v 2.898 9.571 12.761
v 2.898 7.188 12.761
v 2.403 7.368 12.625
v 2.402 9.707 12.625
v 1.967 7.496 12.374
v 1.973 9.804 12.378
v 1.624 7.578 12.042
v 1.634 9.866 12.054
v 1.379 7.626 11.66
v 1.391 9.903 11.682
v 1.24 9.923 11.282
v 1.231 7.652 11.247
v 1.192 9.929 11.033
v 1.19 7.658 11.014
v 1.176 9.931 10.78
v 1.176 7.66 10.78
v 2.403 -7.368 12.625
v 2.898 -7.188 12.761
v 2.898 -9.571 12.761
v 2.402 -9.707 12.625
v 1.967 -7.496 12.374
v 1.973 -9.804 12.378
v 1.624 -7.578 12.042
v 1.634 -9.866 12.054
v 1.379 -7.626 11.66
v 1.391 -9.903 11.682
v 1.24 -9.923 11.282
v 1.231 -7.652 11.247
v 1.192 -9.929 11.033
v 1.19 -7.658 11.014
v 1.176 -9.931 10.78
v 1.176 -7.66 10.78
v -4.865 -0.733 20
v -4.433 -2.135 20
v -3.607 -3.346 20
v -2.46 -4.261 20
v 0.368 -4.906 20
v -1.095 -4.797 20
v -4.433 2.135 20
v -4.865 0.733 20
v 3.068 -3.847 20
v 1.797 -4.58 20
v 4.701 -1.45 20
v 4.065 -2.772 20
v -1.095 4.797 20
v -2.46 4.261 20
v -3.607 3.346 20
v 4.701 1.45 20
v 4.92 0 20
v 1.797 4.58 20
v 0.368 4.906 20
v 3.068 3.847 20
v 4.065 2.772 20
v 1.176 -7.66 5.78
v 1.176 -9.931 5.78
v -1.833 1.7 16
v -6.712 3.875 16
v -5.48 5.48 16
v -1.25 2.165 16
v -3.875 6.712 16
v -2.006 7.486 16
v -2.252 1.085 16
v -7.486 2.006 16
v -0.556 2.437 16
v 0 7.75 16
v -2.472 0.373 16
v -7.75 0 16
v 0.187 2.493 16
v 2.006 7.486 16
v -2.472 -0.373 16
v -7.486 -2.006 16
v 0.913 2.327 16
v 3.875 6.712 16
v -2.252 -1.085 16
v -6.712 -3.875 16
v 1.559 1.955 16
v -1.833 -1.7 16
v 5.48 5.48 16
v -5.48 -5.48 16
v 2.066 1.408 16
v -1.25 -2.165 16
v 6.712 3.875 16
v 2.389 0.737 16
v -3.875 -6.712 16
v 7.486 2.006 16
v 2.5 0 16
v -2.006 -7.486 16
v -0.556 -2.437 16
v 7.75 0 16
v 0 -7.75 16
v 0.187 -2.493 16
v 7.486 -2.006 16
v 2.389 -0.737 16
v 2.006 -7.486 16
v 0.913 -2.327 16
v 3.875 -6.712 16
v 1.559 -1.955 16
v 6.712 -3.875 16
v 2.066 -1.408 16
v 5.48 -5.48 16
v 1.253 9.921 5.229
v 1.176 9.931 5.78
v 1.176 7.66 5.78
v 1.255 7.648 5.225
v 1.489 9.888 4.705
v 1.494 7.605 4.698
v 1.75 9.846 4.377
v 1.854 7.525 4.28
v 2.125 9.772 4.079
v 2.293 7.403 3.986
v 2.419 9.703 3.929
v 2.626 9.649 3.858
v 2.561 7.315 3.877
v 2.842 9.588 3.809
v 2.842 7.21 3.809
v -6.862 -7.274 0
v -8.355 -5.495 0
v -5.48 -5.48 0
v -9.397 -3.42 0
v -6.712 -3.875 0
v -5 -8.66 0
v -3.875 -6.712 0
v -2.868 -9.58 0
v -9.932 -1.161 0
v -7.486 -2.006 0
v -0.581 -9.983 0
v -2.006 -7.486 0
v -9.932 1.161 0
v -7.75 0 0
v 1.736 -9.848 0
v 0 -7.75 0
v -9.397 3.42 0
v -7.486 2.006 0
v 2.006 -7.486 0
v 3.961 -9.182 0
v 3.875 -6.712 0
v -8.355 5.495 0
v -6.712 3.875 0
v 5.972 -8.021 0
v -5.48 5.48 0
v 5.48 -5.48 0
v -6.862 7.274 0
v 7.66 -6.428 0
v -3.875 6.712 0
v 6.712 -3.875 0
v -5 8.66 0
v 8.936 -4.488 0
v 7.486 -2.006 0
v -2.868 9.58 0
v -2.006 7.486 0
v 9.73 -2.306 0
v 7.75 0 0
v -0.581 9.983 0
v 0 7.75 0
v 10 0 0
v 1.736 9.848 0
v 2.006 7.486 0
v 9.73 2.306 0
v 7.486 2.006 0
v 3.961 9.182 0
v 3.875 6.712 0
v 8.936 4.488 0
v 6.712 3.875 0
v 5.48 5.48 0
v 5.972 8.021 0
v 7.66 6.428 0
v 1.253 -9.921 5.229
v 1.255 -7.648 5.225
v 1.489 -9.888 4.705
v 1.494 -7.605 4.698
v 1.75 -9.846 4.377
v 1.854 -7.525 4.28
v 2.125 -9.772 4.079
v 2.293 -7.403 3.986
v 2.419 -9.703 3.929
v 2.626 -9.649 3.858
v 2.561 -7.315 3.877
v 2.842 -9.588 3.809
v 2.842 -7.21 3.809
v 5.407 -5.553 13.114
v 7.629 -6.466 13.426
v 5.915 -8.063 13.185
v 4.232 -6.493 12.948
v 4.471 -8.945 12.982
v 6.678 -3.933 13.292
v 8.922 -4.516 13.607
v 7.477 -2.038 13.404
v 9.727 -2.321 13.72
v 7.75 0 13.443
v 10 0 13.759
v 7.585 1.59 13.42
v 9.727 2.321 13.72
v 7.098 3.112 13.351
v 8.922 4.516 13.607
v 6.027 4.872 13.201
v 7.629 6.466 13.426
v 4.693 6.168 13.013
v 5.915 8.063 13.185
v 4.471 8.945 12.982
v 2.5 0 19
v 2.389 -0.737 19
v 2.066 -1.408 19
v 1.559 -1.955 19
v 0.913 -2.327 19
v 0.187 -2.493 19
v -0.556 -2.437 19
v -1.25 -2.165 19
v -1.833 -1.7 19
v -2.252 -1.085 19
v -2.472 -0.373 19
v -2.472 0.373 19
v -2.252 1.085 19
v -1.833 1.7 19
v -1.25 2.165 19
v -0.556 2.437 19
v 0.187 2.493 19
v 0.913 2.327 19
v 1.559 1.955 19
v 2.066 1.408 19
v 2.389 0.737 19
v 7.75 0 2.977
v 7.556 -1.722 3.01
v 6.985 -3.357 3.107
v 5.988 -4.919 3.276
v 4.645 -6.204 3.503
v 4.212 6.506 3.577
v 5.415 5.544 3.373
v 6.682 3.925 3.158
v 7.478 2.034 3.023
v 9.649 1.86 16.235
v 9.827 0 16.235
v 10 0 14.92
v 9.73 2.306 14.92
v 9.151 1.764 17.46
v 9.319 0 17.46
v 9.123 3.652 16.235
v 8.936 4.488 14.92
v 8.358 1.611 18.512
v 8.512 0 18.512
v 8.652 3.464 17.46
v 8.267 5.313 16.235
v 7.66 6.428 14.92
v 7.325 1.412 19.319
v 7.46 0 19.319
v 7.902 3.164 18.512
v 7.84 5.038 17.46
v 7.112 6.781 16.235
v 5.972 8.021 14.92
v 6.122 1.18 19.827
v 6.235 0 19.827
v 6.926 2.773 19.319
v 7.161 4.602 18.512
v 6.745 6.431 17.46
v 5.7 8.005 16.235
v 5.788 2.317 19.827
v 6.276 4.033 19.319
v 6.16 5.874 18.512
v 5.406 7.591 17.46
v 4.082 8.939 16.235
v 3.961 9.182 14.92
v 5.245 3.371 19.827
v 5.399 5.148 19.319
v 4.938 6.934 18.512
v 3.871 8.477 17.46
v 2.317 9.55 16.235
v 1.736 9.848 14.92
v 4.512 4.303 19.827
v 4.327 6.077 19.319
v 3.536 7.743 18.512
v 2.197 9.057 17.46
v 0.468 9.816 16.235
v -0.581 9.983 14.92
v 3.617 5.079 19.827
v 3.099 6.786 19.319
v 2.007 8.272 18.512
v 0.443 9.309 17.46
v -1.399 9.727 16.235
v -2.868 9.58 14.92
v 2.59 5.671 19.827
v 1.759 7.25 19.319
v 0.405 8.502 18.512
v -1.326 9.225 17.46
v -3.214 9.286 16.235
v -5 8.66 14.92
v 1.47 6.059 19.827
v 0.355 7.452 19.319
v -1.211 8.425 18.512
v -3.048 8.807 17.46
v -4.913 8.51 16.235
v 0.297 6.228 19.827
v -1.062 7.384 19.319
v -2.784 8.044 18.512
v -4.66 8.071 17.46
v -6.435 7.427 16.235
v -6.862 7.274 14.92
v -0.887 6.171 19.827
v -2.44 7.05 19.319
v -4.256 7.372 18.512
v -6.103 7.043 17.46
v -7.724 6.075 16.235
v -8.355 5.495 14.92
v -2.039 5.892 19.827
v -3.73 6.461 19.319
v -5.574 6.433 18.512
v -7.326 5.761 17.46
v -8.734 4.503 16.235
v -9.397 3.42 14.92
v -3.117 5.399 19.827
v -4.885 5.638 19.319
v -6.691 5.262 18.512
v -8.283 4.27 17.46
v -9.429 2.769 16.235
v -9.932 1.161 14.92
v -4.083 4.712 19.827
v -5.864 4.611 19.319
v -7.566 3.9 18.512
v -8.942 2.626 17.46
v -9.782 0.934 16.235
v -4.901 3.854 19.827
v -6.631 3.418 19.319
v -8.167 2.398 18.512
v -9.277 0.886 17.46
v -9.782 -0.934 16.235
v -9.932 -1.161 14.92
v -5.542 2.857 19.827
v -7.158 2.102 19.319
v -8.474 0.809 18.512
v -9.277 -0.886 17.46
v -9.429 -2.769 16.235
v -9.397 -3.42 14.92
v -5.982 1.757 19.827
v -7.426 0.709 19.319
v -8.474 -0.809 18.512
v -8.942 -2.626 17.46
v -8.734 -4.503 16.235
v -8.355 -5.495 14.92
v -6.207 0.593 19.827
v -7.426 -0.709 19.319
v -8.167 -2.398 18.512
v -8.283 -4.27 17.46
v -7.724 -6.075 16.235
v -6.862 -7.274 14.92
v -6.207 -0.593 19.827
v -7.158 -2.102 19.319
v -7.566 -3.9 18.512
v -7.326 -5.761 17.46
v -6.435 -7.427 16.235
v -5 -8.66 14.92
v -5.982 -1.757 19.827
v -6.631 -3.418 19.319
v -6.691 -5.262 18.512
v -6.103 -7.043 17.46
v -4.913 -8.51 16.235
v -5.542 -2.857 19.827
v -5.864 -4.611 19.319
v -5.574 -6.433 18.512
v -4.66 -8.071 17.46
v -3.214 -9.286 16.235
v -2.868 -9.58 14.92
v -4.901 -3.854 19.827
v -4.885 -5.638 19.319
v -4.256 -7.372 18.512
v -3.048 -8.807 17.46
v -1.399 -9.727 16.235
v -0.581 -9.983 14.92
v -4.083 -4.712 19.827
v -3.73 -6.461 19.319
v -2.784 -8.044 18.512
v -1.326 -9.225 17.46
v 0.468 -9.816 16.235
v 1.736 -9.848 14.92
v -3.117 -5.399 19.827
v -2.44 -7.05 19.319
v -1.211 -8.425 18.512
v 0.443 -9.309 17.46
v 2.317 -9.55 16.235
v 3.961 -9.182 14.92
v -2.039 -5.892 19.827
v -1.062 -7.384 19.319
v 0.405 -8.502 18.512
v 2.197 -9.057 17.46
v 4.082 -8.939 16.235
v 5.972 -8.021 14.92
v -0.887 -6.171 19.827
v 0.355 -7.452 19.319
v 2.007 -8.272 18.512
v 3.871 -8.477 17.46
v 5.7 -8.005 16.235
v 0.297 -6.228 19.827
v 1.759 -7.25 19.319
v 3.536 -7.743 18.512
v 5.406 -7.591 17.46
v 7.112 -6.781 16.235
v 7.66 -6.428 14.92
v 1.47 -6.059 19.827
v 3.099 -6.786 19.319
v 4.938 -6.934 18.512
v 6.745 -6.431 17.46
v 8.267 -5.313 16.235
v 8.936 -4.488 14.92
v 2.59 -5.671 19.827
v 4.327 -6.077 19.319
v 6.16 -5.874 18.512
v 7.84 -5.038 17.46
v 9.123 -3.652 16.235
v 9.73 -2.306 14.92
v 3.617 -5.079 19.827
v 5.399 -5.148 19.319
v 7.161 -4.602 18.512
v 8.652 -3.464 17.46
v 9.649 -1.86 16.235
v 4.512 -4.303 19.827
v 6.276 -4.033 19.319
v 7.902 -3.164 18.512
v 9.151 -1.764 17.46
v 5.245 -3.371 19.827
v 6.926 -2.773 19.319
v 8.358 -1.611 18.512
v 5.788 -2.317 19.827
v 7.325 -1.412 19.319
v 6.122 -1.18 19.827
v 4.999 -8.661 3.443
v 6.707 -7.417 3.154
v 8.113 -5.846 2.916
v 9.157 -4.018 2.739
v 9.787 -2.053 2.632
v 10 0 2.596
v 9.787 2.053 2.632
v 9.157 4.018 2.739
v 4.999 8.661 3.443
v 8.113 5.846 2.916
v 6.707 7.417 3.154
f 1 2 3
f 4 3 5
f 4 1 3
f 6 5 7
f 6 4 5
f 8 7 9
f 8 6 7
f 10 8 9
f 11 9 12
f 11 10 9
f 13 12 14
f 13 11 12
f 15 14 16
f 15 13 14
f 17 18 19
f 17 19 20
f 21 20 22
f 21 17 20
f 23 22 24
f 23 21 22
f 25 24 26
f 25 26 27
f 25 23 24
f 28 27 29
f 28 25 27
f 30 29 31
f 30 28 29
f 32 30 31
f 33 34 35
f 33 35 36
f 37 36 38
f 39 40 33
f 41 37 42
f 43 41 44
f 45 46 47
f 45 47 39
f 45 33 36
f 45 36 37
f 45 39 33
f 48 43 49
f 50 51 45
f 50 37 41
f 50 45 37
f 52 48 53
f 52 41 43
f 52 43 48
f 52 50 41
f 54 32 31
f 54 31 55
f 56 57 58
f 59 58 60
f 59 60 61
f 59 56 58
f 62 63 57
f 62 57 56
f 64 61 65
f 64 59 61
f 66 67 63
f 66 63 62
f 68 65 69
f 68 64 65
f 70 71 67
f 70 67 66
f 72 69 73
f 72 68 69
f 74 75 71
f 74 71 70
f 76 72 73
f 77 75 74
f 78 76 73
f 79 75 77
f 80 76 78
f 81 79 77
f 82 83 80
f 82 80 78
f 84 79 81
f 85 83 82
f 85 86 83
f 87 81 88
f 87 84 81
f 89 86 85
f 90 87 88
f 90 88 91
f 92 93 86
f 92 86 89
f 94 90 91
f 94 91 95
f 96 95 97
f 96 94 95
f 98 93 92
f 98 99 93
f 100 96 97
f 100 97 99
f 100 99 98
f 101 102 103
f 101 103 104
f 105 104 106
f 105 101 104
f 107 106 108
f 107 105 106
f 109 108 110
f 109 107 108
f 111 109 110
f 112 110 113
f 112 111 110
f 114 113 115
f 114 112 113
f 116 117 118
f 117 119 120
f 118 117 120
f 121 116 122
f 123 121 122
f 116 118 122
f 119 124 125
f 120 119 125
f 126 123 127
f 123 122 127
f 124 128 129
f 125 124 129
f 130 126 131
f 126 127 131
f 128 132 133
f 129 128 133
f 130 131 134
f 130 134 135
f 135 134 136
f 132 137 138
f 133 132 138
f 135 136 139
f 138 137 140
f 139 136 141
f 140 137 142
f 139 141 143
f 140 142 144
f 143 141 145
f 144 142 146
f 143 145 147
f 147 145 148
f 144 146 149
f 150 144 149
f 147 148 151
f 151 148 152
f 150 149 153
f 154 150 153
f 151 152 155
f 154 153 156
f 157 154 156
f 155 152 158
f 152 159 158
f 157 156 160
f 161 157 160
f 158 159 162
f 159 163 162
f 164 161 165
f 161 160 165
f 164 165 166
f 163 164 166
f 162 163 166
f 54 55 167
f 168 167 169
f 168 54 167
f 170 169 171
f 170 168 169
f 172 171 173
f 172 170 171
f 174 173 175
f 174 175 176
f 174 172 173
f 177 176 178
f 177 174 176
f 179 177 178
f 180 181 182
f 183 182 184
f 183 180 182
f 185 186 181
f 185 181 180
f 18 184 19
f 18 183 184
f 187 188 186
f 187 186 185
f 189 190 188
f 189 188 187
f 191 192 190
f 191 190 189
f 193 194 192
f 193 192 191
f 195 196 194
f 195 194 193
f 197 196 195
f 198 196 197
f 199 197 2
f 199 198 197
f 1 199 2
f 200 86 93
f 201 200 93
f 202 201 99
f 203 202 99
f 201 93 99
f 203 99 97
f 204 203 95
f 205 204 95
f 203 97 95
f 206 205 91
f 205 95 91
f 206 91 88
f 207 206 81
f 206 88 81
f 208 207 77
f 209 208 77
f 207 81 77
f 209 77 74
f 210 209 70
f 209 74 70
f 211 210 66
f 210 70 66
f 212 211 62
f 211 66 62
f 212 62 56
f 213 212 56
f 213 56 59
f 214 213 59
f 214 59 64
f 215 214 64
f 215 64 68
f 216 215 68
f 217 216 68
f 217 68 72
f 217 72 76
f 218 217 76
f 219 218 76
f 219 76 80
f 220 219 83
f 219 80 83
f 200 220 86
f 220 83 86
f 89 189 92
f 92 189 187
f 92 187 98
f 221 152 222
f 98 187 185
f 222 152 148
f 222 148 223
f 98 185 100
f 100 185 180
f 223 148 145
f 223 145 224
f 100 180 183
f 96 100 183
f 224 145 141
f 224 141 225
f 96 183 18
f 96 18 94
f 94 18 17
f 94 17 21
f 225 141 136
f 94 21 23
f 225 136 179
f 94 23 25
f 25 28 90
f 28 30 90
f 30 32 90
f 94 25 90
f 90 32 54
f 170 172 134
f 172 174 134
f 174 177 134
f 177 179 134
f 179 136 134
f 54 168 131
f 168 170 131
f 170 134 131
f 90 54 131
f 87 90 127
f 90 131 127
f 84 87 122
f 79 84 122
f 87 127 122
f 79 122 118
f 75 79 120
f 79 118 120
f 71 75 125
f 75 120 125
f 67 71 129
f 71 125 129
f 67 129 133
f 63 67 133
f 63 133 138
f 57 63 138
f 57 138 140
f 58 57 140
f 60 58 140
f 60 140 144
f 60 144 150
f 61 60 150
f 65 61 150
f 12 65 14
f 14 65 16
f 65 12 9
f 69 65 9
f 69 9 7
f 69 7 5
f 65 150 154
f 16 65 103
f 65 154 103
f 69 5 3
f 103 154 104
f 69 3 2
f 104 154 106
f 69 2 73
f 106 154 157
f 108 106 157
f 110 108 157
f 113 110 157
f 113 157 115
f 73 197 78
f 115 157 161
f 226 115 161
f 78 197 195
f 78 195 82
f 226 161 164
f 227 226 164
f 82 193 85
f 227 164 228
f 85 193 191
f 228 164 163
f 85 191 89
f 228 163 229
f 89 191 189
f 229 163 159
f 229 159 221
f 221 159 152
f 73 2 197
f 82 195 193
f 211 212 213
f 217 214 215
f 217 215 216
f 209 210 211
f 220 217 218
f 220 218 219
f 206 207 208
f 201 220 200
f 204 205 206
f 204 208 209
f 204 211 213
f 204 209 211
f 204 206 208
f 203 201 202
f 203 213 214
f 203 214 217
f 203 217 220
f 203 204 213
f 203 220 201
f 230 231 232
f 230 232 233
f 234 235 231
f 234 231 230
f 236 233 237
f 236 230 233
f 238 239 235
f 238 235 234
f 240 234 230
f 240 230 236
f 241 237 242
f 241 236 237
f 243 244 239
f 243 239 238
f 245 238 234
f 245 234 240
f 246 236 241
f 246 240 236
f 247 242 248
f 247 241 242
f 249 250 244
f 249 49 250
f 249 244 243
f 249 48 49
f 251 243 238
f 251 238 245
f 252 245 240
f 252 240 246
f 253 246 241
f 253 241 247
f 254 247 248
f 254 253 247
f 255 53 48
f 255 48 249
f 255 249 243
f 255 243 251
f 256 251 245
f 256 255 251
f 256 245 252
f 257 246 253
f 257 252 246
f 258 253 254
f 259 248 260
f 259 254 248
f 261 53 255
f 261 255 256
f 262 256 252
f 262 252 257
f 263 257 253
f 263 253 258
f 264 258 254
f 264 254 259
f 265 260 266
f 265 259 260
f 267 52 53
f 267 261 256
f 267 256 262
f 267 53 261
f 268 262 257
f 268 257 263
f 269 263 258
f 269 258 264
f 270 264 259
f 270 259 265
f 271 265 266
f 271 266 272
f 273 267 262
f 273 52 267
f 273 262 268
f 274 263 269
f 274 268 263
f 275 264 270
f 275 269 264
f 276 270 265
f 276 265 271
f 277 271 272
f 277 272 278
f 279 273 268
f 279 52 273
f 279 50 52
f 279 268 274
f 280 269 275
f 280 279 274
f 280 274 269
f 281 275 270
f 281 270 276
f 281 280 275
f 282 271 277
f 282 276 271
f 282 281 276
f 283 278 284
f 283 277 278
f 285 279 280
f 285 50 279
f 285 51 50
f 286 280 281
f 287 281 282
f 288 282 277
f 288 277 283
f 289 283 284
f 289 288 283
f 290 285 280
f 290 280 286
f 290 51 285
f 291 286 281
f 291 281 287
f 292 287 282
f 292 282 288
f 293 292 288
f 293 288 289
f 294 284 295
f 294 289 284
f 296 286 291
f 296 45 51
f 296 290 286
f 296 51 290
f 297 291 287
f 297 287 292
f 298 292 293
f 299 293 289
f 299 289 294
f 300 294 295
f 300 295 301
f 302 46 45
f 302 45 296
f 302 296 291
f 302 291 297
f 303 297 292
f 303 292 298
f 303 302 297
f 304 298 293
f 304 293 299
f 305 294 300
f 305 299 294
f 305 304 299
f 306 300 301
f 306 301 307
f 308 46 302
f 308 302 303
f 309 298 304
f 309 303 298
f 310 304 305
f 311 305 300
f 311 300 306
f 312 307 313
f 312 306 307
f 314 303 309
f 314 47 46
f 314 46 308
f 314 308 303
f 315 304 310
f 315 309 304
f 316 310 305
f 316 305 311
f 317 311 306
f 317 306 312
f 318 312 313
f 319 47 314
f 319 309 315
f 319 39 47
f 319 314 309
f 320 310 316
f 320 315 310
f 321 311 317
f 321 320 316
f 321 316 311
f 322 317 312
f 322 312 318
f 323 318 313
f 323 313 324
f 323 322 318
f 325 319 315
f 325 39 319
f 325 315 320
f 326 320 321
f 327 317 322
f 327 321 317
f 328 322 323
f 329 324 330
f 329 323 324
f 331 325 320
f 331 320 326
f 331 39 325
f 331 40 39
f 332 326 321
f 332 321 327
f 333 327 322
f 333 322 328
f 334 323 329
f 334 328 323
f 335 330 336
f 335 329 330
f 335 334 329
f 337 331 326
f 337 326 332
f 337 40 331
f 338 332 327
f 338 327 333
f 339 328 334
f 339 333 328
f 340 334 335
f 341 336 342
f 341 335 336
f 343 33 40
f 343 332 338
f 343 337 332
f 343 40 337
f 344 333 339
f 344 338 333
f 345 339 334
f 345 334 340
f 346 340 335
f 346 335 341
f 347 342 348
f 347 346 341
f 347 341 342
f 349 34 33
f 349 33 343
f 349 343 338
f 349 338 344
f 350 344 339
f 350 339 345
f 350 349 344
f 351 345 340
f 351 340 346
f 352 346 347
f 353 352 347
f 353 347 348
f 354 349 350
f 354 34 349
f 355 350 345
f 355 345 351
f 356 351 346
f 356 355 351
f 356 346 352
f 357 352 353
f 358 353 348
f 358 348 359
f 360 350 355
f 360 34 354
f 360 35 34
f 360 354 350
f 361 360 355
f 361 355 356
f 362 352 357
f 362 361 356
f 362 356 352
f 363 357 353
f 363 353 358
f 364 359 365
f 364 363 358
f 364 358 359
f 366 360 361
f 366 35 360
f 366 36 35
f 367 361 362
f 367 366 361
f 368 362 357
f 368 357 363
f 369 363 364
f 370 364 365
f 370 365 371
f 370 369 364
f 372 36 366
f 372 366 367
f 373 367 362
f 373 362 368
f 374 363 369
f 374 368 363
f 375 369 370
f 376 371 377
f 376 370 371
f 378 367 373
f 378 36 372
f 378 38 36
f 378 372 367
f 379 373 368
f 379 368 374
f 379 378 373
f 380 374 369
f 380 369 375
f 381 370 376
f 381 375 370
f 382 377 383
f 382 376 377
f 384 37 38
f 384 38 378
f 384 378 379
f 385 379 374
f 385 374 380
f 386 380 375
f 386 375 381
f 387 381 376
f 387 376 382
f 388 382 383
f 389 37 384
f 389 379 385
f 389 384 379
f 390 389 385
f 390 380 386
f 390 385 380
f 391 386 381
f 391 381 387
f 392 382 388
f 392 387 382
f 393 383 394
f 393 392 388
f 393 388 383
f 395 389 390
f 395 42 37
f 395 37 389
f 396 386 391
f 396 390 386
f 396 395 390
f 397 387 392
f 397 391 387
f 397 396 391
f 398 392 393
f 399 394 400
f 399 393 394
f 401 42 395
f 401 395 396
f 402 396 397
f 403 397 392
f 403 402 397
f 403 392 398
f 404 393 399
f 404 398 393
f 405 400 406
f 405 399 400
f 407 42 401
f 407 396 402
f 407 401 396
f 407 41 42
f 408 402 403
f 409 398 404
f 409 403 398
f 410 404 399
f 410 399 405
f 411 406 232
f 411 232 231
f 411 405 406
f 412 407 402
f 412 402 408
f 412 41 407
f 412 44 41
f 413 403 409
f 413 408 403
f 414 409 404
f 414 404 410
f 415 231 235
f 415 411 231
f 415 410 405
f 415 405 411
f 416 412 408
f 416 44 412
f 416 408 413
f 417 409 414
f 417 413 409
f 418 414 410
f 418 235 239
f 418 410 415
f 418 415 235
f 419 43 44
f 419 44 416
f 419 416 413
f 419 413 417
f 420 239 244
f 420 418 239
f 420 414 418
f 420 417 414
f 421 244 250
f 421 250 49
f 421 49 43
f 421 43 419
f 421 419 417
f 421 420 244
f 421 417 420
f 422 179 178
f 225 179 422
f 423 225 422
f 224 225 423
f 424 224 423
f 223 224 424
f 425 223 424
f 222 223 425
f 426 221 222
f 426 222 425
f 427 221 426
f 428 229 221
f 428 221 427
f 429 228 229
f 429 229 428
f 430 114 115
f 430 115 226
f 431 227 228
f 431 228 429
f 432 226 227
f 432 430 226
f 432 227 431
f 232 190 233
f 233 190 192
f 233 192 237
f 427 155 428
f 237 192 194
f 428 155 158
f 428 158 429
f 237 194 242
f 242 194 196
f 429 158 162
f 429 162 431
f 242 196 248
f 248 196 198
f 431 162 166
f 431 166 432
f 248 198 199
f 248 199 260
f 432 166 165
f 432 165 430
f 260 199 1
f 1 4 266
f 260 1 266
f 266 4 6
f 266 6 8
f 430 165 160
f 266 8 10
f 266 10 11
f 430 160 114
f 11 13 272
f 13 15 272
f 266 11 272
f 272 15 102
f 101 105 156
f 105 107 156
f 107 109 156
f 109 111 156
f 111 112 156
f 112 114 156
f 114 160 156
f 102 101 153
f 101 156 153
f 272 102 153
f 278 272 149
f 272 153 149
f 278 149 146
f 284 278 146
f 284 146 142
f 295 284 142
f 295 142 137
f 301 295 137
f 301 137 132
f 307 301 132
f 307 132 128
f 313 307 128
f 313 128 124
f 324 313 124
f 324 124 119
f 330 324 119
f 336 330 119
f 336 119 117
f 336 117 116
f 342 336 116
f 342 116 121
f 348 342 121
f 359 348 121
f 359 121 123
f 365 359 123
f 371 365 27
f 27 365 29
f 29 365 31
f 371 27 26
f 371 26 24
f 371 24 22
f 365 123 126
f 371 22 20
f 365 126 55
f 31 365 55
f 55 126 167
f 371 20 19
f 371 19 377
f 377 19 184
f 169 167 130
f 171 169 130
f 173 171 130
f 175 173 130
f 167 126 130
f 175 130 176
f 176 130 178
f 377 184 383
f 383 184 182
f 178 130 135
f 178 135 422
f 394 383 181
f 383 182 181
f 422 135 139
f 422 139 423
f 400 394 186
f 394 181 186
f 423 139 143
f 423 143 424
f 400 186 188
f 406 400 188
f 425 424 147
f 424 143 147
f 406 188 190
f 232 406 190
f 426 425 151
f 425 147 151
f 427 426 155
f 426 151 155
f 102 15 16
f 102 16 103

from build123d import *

# Parameters (mm, degrees)
F0_R     = 10
F1_DEPTH = 20
F3_R     = 5.08
F4_DEPTH = 25
F5_DEPTH = 25.4
F6_R     = 7.75
F7_DEPTH = 16
F8_R     = 2.5
F9_DEPTH = 3


with BuildPart() as f1:
    # F0 (on Top) → F1 (new body)
    with BuildSketch(Plane.XY):
        Circle(F0_R)
    extrude(amount=F1_DEPTH)

    # F3
    f3_edges = [f1.edges().sort_by_distance(p)[0] for p in [
        (-10, 0, 20),
    ]]
    fillet(f3_edges, radius=F3_R)

    # F2 (on Front) → F4 (cut)
    with BuildSketch(Plane.XZ):
        with BuildLine():
            Line((13.2011724636, 2.0541311242), (10.8197718092, 13.8740318547))
            Line((10.8197718092, 13.8740318547), (2.8975781604, 12.7609964594))
            ThreePointArc((2.8975781604, 12.7609964594), (1.666446785, 12.0925993918), (1.1758370092, 10.7804480472))
            Line((1.1758370092, 10.7804480472), (1.1758370092, 5.7804480472))
            ThreePointArc((1.1758370092, 5.7804480472), (1.6481085109, 4.4896941453), (2.8418826446, 3.8085265269))
            Line((2.8418826446, 3.8085265269), (13.2011724636, 2.0541311242))
        make_face()
    extrude(amount=-F4_DEPTH, mode=Mode.SUBTRACT)

    # F5 (cut): a face of the model
    f5_faces = [f1.faces().sort_by_distance(p)[0] for p in [
        (5.8523701774, 0, 8.2355862053),
    ]]
    extrude(f5_faces, amount=-F5_DEPTH, mode=Mode.SUBTRACT)

    # F6 (on face) → F7 (cut)
    with BuildSketch(Plane(origin=(0, 0, 0), x_dir=(1, 0, 0), z_dir=(0, 0, -1))):
        Circle(F6_R)
    extrude(amount=-F7_DEPTH, mode=Mode.SUBTRACT)

    # F8 (on face) → F9 (cut)
    with BuildSketch(Plane(origin=(0, 0, 16), x_dir=(1, 0, 0), z_dir=(0, 0, -1))):
        Circle(F8_R)
    extrude(amount=-F9_DEPTH, mode=Mode.SUBTRACT)


solid = f1.part
